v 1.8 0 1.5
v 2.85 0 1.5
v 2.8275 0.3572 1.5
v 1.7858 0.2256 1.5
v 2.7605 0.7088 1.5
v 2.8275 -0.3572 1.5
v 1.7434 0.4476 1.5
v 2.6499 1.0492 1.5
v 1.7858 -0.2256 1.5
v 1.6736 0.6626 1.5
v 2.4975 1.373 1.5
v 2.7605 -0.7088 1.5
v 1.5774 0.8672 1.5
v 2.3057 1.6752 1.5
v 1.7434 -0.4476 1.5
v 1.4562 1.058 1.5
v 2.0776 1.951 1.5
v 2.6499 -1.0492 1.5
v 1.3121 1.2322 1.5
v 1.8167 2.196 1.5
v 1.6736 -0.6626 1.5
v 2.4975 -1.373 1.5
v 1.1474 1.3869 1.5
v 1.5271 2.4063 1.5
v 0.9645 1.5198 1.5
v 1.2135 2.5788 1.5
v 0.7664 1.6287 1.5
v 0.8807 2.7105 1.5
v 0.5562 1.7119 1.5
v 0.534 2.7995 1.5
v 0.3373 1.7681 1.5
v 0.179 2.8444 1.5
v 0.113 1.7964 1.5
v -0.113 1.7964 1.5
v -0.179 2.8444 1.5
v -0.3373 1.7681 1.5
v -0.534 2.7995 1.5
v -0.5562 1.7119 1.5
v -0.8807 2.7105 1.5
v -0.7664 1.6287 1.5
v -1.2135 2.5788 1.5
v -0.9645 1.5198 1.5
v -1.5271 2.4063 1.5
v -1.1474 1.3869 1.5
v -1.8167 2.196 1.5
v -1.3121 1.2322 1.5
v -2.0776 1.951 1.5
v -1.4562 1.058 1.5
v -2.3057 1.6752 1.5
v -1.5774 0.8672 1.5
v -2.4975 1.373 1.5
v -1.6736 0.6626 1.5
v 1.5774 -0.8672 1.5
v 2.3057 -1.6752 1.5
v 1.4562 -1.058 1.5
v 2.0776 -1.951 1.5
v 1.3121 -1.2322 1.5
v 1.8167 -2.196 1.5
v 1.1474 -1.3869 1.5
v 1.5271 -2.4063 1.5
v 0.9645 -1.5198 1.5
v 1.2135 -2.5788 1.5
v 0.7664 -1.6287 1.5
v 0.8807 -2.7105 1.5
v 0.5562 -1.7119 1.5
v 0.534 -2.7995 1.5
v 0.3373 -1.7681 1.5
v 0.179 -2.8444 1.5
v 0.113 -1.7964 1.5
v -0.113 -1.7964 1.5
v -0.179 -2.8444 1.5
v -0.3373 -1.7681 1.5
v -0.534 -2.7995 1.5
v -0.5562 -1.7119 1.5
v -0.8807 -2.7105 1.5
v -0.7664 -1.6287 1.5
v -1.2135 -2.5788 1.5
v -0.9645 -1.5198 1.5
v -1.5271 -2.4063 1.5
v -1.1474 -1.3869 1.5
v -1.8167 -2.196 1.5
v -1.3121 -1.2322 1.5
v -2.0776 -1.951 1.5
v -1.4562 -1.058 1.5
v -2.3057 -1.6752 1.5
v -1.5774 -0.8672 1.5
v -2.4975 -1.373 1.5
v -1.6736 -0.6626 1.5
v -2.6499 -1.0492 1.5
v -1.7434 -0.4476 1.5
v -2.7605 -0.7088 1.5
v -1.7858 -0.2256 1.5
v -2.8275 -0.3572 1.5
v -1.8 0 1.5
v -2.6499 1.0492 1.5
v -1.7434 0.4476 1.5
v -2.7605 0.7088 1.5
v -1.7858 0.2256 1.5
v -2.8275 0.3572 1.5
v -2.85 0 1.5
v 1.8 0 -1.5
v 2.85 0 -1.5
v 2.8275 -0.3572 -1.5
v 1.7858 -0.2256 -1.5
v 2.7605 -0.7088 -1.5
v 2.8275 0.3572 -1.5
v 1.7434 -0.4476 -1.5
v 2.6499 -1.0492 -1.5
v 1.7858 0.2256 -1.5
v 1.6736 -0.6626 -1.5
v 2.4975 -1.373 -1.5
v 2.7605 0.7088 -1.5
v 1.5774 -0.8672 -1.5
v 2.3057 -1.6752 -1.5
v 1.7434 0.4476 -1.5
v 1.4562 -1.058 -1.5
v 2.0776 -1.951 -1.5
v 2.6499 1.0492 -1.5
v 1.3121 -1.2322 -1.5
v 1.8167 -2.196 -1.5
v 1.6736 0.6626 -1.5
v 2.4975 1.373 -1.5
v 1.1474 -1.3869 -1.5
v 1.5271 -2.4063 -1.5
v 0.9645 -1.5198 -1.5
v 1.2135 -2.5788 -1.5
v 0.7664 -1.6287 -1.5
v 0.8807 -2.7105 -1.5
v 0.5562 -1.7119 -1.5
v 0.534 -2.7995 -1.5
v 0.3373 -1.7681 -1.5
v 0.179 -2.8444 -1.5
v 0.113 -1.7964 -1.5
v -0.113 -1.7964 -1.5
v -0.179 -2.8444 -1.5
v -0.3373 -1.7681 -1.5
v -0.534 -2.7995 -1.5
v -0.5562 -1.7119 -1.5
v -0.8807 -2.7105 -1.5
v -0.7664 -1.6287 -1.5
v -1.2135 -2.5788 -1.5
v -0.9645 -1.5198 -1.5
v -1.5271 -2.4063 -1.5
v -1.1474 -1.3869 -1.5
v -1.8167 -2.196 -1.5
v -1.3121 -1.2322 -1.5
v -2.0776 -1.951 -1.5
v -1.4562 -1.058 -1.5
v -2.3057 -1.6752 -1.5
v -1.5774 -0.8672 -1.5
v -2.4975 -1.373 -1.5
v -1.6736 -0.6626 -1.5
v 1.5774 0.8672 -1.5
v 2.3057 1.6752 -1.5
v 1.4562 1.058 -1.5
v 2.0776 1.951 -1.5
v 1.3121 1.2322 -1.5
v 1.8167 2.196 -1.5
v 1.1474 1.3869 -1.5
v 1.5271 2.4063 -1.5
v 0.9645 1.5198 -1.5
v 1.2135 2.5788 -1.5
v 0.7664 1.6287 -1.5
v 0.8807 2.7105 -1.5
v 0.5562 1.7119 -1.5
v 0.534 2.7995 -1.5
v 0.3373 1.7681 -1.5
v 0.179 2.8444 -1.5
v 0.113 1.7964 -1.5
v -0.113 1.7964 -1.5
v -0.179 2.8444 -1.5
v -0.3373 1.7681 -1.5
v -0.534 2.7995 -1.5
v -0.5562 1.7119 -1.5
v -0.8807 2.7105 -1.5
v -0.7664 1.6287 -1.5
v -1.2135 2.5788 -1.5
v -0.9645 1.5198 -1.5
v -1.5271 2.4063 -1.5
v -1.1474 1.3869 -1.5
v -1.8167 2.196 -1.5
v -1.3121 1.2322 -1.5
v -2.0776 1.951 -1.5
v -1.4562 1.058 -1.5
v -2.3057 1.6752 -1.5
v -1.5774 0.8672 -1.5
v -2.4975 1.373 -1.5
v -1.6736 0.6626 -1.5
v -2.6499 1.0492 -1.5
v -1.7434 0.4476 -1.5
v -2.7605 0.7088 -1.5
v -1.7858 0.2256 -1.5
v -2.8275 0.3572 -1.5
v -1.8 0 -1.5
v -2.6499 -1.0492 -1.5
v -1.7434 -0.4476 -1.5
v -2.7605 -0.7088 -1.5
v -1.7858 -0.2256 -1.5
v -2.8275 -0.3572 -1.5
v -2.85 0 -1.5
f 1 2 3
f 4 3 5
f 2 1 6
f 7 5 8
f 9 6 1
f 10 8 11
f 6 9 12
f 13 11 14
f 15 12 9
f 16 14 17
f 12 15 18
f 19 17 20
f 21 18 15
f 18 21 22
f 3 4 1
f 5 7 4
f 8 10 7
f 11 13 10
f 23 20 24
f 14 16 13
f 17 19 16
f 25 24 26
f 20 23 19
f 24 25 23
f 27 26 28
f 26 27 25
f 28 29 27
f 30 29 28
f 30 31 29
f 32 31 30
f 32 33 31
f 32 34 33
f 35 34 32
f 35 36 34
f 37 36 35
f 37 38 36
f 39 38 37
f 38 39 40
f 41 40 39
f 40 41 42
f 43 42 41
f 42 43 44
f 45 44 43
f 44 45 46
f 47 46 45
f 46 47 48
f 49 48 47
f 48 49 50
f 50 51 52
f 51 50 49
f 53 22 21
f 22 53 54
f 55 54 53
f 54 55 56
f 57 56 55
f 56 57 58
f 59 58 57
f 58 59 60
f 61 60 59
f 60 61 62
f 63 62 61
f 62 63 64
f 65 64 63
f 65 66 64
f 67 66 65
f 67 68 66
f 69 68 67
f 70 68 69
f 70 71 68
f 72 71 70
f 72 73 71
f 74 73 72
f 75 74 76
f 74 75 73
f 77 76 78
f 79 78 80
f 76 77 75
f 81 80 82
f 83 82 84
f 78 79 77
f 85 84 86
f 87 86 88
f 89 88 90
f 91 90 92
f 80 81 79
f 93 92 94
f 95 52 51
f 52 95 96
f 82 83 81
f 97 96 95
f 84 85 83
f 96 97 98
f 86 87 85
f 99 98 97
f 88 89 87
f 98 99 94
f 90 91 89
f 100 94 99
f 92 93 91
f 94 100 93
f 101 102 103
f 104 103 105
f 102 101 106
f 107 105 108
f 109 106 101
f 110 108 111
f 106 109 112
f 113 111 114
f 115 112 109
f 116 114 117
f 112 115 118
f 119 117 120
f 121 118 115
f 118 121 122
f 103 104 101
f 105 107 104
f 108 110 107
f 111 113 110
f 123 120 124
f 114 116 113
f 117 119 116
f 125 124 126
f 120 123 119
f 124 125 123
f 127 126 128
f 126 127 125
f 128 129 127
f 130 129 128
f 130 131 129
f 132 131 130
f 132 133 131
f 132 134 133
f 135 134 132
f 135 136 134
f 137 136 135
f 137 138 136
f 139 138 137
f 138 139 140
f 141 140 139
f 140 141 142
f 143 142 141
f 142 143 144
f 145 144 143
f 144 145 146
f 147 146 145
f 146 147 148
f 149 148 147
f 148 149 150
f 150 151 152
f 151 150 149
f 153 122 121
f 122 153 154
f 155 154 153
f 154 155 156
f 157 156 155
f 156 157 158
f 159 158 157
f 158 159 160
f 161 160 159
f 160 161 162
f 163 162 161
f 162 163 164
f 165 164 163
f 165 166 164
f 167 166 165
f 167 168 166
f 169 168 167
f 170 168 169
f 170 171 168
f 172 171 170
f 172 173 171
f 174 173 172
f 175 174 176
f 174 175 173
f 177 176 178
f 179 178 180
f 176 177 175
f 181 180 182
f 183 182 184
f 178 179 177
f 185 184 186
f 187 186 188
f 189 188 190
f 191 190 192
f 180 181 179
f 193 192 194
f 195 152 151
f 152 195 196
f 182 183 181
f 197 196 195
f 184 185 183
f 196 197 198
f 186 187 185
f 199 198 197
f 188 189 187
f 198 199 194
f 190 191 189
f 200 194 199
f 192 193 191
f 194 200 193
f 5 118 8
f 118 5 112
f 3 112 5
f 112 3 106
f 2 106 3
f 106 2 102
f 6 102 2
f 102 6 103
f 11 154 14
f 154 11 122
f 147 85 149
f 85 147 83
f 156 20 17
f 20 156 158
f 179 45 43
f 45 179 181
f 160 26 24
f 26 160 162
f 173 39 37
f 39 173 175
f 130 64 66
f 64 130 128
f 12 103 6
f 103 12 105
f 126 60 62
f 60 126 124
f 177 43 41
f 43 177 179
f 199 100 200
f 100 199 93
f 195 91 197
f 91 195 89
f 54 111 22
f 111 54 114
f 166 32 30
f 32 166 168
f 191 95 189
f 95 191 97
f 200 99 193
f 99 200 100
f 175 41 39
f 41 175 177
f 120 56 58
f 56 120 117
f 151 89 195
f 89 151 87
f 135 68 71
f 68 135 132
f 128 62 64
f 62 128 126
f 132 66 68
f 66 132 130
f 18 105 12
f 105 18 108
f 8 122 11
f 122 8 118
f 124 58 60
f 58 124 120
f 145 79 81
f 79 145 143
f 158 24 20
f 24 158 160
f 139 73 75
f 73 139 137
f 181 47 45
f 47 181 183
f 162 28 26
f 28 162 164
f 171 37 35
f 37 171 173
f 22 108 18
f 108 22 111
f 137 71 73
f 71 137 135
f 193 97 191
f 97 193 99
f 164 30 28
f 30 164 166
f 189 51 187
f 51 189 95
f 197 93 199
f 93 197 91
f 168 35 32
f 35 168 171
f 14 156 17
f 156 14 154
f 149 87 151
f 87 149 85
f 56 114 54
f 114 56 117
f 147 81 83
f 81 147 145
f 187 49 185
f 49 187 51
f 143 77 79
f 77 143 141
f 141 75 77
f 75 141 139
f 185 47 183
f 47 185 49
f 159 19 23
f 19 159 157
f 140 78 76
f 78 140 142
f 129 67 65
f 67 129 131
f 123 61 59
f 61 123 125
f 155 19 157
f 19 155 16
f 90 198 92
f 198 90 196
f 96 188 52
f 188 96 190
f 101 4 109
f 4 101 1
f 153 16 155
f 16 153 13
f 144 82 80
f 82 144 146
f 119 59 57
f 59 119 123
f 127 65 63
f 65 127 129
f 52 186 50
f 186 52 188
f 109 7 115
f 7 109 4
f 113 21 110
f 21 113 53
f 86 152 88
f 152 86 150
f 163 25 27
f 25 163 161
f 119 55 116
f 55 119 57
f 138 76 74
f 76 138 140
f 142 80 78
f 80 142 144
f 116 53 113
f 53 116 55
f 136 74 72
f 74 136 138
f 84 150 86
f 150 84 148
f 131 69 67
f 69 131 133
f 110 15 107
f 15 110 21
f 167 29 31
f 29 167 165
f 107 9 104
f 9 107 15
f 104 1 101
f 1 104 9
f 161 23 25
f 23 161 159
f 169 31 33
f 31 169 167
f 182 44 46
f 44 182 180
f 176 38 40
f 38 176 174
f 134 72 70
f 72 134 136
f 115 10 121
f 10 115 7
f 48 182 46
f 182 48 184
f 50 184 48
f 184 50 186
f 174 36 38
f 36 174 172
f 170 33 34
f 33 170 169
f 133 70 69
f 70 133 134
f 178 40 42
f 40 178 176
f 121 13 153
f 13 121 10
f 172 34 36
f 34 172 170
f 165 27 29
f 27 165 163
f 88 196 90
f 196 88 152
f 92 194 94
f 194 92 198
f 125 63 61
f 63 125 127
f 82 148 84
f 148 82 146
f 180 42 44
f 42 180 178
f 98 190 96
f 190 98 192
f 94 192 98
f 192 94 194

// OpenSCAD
$fn = 50;


difference() {
	union() {
		translate(v = [0, 0, -1.5000000000]) {
			cylinder(h = 3, r = 1.0000000000);
		}
		translate(v = [0, 0, -1.5000000000]) {
			cylinder(h = 3, r = 2.8500000000);
		}
	}
	union() {
		translate(v = [0, 0, -50.0000000000]) {
			cylinder(h = 100, r = 1.8000000000);
		}
	}
}
